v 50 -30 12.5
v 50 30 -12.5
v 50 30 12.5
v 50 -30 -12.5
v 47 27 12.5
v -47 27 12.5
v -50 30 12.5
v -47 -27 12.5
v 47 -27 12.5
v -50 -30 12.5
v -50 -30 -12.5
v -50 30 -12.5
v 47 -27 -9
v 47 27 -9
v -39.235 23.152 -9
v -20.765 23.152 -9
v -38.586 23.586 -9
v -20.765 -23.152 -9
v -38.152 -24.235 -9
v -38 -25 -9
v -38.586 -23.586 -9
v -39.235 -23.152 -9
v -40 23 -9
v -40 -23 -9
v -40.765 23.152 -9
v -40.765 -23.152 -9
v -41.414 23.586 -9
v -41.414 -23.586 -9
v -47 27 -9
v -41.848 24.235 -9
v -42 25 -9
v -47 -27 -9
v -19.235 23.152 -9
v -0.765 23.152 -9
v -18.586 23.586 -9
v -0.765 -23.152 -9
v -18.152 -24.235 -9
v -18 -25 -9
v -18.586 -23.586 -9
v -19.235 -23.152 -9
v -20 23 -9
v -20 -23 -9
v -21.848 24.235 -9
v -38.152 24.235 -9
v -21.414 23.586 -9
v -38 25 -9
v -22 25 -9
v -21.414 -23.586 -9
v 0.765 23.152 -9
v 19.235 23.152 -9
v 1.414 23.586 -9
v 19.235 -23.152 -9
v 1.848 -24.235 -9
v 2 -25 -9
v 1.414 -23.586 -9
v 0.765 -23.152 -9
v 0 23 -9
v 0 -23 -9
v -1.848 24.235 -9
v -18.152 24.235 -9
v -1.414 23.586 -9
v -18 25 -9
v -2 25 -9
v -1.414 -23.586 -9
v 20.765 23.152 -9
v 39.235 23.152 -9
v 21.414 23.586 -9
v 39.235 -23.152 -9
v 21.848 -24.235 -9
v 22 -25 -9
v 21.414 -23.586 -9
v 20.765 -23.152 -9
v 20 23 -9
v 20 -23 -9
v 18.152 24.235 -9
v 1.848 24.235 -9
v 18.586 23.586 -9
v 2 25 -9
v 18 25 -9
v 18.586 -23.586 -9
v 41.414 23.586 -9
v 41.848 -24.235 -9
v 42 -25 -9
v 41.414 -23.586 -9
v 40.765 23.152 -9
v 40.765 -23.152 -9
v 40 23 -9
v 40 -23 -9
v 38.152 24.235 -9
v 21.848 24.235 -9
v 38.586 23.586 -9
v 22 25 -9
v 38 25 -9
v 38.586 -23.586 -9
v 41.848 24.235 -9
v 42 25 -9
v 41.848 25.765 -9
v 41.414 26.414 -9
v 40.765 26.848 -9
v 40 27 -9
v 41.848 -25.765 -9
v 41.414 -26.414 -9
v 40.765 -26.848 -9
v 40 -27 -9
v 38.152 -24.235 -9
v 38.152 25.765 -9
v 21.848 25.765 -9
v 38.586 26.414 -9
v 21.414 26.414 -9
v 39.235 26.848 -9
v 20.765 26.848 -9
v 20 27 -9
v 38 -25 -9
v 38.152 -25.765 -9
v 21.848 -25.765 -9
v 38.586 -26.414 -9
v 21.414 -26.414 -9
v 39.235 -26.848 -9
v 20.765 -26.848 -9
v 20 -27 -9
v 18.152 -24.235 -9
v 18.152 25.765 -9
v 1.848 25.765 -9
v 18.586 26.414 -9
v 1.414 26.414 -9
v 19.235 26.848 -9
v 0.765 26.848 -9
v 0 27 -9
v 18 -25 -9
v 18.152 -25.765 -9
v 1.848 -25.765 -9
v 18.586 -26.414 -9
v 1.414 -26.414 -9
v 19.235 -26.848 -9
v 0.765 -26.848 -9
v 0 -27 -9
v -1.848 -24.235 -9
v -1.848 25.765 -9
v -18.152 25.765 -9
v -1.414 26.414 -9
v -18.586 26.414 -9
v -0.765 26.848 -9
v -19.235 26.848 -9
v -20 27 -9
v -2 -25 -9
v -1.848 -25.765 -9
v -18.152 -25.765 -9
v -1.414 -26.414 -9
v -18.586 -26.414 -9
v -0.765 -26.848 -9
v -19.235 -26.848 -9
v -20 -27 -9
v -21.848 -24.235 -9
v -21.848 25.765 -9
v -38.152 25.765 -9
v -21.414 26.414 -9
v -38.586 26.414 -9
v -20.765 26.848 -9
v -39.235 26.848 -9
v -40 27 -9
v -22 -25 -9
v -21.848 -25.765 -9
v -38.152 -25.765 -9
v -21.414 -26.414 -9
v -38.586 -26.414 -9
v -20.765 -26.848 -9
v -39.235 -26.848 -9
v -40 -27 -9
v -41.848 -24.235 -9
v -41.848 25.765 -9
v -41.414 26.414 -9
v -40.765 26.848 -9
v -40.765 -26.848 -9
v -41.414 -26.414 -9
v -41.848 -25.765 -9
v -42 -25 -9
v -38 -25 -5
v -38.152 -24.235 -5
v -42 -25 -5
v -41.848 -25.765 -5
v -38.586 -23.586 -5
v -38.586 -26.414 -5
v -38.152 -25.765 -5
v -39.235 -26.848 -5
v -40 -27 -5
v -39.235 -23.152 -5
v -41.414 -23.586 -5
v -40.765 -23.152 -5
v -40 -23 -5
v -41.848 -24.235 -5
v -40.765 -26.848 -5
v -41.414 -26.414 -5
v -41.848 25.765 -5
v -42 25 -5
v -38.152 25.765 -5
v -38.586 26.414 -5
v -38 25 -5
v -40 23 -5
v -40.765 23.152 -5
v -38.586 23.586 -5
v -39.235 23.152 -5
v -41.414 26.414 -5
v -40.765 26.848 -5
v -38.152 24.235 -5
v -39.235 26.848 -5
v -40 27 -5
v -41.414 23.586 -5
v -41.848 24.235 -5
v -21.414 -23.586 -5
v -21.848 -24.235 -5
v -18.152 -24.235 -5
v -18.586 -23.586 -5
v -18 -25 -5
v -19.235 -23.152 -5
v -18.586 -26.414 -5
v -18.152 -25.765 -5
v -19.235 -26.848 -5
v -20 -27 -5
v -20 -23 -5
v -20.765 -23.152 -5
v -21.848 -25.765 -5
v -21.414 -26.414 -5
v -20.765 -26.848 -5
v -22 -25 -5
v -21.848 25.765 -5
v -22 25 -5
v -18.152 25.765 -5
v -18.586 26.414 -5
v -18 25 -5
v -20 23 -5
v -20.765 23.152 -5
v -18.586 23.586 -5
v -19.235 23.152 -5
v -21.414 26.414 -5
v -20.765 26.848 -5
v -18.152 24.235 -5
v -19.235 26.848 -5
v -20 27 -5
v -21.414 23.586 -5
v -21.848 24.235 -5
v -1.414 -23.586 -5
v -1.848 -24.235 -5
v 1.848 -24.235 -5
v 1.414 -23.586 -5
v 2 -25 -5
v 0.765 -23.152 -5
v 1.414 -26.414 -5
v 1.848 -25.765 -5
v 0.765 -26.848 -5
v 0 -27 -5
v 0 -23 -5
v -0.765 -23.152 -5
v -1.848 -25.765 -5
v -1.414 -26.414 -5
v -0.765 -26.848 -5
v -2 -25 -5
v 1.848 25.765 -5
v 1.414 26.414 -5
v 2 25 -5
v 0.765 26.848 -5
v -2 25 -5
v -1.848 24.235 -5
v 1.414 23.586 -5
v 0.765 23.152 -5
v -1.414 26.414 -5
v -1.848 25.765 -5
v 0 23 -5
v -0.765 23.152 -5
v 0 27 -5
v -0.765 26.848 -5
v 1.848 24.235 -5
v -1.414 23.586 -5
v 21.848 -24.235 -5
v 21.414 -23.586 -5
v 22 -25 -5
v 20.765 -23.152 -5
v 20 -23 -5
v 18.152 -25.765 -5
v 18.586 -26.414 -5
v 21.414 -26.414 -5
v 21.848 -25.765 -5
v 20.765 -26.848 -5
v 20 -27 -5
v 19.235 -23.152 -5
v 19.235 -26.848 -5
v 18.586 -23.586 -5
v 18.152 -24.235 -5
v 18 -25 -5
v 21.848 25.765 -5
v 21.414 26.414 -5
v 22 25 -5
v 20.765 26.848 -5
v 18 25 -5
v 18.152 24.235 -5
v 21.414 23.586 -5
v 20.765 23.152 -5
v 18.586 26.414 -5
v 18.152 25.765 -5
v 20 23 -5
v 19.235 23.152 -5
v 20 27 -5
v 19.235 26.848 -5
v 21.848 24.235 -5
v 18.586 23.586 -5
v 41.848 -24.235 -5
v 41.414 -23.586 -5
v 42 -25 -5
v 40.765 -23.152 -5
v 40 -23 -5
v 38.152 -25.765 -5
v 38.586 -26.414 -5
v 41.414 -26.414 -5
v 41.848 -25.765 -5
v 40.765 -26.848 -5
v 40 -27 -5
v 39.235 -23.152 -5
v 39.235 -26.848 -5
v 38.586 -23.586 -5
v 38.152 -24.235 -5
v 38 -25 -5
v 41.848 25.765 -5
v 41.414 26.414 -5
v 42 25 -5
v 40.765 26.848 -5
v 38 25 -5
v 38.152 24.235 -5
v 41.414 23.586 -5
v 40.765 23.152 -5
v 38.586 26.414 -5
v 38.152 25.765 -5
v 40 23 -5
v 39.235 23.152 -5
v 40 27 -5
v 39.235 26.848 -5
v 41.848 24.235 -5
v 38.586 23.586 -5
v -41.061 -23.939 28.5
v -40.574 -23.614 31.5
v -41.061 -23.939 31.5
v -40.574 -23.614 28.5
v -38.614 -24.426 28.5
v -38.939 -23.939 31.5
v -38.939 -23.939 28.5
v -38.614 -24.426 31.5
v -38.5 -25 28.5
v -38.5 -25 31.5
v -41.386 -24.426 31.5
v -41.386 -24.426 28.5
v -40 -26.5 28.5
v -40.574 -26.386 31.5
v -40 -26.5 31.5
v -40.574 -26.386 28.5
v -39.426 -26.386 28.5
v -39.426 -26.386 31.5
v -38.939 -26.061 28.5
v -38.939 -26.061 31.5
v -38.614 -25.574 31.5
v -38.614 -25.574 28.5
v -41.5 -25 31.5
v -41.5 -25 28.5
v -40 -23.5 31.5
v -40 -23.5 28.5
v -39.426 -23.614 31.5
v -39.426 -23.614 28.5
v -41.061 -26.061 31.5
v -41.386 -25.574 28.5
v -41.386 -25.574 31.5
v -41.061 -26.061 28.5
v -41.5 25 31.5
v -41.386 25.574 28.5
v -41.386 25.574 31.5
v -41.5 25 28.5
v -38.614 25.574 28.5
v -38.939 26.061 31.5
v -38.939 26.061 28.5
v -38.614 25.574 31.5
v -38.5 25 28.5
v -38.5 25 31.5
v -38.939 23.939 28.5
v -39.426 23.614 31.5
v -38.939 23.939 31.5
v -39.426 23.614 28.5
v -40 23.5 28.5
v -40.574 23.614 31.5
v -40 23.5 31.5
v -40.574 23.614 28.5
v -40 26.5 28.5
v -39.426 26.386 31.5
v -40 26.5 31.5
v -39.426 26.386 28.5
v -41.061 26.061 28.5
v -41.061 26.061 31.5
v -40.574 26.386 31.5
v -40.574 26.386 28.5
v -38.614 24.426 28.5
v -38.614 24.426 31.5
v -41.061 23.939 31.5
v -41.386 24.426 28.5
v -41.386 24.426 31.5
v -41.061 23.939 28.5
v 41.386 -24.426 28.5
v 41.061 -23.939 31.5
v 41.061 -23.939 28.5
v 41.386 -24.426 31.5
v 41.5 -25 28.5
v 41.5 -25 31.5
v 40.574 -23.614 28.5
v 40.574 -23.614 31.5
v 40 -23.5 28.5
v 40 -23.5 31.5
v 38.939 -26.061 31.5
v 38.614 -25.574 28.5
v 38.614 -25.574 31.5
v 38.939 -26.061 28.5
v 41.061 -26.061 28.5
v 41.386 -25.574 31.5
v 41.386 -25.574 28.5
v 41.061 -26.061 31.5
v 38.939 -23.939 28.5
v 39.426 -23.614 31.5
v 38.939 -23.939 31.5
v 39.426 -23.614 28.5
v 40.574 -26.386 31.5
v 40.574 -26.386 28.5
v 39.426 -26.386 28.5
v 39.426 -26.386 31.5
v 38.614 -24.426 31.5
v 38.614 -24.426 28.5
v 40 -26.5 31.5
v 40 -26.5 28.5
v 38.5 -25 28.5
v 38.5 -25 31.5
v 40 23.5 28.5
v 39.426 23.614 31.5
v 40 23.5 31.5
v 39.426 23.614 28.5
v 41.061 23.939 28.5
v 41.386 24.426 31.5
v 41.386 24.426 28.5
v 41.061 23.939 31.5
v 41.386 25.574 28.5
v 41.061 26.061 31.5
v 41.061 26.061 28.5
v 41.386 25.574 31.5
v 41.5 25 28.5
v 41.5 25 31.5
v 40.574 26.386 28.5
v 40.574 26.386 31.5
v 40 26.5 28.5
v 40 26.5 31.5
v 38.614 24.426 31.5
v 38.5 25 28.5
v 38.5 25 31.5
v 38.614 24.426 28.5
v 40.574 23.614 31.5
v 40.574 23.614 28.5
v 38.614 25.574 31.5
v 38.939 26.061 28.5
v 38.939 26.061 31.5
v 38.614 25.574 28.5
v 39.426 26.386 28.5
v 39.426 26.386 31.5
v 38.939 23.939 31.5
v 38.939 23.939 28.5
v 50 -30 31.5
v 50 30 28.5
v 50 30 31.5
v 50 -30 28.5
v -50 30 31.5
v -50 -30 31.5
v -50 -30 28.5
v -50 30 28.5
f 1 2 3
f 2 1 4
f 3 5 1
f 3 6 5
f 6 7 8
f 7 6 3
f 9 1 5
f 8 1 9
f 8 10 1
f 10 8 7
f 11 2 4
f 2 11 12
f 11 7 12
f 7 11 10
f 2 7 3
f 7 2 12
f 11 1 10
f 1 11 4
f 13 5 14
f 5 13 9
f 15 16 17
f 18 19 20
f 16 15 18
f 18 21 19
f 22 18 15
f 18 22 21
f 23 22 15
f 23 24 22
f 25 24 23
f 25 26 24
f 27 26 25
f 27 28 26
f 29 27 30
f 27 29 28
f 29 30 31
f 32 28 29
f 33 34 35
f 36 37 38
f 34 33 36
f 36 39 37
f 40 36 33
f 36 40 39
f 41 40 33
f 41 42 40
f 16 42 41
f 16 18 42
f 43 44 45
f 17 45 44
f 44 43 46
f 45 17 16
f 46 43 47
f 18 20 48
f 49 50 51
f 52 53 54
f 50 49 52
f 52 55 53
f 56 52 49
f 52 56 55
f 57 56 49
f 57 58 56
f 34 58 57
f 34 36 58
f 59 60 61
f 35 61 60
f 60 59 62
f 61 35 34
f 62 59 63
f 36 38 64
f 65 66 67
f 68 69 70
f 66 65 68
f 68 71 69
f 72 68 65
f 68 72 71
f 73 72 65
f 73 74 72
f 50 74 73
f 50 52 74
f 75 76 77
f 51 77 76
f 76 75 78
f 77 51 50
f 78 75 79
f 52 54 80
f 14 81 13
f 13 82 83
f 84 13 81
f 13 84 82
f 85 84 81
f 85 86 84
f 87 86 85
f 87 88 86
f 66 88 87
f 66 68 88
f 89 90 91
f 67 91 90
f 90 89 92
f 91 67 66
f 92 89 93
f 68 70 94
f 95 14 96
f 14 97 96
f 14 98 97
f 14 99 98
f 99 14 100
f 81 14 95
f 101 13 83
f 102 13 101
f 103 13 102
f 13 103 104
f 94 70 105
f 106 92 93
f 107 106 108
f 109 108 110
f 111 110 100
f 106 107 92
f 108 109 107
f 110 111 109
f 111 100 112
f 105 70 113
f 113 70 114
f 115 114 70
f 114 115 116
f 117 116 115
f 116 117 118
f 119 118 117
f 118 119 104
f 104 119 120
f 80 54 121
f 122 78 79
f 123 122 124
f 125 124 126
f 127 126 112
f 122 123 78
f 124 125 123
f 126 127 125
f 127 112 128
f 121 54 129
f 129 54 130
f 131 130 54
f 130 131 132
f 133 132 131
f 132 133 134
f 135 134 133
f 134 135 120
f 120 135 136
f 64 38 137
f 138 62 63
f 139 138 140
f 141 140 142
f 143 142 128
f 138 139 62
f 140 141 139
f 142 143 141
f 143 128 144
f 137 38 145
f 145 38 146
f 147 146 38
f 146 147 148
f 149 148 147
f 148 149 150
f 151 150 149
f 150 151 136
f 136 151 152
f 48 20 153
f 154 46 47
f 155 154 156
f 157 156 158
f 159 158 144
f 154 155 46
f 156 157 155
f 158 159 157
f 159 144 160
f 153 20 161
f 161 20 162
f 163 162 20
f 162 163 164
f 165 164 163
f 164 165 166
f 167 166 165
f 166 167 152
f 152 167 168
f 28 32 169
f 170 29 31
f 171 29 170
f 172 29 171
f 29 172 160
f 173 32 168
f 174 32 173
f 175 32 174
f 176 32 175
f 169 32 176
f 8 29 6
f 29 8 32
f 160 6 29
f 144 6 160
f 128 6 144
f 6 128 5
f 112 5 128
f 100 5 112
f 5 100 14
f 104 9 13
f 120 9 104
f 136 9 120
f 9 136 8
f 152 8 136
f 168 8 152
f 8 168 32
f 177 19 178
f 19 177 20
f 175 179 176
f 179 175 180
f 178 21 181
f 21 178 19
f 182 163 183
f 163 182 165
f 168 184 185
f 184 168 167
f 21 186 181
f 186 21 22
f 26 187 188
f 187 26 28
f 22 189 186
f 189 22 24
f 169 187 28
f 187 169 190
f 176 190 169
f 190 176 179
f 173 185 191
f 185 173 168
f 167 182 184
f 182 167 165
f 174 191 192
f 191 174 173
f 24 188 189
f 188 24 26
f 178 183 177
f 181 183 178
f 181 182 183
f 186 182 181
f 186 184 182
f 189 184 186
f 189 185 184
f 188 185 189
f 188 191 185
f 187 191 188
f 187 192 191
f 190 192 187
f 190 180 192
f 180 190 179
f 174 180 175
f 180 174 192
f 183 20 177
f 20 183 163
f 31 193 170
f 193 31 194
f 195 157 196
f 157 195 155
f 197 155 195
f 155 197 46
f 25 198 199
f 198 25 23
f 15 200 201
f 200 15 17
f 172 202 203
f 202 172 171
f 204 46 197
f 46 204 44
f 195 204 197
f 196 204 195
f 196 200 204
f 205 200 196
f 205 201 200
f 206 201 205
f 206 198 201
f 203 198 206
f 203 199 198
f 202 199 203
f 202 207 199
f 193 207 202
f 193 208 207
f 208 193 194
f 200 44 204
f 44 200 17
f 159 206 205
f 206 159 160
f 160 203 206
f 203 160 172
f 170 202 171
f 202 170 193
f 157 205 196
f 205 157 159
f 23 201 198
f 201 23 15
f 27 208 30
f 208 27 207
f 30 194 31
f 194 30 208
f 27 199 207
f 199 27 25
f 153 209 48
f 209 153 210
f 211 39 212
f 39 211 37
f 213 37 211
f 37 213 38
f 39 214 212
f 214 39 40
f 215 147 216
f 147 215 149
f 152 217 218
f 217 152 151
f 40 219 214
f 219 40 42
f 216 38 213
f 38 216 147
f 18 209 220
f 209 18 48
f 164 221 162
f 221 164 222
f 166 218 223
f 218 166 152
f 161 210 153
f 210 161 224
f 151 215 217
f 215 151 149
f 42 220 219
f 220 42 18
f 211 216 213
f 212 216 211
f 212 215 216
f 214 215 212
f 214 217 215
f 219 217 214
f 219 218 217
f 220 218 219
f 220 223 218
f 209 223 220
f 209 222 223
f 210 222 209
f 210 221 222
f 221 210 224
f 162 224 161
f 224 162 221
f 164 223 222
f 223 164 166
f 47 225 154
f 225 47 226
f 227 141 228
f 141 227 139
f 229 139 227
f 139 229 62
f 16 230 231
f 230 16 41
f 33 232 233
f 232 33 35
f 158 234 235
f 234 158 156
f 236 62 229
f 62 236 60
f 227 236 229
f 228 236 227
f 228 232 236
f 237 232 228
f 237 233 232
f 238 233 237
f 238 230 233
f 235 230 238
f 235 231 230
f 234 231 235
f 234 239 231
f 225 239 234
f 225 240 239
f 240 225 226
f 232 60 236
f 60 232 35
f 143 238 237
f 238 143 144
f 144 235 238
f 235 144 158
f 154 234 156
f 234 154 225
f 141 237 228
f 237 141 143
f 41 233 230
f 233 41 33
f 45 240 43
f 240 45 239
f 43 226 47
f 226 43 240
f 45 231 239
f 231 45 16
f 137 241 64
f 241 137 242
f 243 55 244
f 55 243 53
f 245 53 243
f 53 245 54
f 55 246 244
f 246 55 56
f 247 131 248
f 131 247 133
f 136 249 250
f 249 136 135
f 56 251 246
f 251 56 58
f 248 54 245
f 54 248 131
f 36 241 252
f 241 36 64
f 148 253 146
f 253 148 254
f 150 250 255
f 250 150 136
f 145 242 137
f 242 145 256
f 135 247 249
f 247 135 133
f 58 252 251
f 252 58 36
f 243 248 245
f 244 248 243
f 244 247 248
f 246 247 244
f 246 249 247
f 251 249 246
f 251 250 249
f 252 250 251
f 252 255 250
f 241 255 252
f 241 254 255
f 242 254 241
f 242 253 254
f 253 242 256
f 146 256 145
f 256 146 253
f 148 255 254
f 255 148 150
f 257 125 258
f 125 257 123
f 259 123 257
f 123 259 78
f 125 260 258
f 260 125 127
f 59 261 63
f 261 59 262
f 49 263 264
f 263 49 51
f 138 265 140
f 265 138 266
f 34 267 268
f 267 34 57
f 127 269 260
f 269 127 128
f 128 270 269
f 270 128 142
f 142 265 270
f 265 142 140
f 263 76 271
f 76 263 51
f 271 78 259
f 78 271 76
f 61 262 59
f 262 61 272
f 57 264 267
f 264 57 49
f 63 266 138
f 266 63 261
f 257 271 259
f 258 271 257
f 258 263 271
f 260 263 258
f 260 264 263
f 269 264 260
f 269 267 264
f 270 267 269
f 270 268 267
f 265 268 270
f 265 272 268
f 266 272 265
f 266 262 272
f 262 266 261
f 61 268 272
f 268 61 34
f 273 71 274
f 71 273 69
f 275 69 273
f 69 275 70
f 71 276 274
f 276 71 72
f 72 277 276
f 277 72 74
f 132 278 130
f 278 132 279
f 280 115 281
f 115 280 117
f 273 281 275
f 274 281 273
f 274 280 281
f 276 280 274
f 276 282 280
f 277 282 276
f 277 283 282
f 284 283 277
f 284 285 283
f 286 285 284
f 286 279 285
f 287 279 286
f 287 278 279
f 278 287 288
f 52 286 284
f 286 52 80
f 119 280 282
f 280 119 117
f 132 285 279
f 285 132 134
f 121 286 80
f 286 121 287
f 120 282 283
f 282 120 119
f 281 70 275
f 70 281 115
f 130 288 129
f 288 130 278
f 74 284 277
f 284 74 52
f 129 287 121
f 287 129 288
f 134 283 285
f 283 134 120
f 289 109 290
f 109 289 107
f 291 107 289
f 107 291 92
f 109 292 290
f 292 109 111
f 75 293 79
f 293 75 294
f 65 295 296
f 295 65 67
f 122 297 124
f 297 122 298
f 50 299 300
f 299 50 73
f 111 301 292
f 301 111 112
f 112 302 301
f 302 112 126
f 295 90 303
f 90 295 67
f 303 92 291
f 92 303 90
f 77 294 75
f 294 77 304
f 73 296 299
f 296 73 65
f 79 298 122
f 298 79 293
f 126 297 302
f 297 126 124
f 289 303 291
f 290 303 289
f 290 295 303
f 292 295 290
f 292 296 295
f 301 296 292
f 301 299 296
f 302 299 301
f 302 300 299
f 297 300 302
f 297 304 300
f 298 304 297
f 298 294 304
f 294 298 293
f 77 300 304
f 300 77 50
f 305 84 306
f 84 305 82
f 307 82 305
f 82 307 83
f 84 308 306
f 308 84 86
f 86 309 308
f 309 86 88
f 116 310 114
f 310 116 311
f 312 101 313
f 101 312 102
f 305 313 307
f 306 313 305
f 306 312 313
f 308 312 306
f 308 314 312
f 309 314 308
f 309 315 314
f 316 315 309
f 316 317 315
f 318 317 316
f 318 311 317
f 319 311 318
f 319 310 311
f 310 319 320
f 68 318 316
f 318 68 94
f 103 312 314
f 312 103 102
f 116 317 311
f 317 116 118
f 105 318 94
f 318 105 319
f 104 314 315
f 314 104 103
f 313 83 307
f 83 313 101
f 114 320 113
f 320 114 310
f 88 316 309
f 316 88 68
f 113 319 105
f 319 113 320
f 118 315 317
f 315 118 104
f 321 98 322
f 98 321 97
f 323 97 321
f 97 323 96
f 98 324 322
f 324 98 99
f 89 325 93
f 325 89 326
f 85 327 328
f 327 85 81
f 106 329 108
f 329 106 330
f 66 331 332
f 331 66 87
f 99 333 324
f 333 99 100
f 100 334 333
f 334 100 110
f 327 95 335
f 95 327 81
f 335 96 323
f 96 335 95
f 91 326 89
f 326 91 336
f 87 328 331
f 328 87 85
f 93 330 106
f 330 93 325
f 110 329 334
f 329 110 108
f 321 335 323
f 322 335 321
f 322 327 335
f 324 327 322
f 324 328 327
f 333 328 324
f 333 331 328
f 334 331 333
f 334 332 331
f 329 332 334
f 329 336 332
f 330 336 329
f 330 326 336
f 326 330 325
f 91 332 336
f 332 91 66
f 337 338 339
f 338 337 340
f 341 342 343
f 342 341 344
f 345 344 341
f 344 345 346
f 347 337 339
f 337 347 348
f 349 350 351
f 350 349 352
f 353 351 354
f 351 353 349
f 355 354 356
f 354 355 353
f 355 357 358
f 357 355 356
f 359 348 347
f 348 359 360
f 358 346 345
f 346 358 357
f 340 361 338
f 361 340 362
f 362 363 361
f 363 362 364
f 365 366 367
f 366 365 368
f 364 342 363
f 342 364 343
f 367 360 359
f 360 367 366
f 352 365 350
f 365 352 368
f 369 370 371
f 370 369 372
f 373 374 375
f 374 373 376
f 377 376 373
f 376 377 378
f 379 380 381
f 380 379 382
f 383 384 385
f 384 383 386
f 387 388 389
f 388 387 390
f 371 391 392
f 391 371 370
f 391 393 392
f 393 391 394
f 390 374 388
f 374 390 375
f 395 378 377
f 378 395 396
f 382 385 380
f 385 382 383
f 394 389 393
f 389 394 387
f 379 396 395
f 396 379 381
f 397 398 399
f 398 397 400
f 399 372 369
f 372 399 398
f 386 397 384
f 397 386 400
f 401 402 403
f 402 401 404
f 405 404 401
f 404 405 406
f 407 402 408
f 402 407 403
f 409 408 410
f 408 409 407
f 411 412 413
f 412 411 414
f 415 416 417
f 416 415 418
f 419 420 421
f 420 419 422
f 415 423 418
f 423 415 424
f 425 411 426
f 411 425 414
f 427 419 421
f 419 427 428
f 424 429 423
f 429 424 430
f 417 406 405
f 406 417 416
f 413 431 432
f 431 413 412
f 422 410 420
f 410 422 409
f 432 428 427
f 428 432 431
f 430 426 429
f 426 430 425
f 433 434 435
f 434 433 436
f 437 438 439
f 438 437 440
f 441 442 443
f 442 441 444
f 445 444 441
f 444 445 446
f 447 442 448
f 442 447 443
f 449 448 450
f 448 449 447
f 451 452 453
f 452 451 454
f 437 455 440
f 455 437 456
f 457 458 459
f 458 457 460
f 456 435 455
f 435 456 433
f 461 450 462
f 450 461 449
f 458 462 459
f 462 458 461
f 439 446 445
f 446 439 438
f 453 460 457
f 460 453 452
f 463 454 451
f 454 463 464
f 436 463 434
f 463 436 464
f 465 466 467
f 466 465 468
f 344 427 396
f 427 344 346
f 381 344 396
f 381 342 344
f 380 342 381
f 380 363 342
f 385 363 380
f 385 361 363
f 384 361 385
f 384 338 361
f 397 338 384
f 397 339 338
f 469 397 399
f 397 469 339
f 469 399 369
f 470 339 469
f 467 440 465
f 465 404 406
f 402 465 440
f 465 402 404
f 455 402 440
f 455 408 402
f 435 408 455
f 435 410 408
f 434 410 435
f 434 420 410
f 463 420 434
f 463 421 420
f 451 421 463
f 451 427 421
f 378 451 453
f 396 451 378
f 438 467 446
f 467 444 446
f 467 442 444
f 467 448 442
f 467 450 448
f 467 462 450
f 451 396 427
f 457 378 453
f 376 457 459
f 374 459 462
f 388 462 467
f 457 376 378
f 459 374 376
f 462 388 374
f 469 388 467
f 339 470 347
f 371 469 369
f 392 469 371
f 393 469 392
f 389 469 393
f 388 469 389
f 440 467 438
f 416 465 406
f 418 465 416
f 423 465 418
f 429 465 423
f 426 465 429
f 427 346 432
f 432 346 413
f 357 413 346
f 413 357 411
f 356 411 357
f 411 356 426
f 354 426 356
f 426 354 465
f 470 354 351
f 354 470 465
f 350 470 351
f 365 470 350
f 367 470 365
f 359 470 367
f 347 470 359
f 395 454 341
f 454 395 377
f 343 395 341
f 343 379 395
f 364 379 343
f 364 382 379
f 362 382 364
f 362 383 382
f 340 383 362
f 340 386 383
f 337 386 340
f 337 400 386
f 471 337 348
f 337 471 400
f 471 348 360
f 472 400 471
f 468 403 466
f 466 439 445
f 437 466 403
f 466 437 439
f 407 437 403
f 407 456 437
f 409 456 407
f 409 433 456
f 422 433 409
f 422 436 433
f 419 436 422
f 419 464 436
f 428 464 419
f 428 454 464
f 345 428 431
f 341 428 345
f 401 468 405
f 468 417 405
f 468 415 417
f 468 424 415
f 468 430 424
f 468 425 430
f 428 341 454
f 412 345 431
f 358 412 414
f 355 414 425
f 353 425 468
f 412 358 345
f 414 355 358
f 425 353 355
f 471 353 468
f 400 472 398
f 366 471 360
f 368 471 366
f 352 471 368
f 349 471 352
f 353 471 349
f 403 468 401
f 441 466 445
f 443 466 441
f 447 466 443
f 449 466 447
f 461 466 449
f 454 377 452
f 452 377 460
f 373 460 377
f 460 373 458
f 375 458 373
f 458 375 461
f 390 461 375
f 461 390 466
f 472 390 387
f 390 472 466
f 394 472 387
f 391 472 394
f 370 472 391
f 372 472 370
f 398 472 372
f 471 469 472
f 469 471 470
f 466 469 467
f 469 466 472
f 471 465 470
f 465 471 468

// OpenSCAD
// AvtoPilot-5 Lot 5.6
module body() { difference() { cube([100,60,25],center=true); translate([0,0,2]) cube([94,54,22],center=true); } }
module mounts() { for(x=[-40,-20,0,20,40]) { translate([x,-25,-10]) cylinder(h=5,r=2,$fn=16); translate([x,25,-10]) cylinder(h=5,r=2,$fn=16); } }
module lid() { translate([0,0,30]) difference() { cube([100,60,3],center=true); for(x=[-40,40]) for(y=[-25,25]) translate([x,y,0]) cylinder(h=5,r=1.5,center=true,$fn=16); } }
color("SteelBlue") body(); color("Gold") mounts(); color("LightBlue",0.7) lid();
